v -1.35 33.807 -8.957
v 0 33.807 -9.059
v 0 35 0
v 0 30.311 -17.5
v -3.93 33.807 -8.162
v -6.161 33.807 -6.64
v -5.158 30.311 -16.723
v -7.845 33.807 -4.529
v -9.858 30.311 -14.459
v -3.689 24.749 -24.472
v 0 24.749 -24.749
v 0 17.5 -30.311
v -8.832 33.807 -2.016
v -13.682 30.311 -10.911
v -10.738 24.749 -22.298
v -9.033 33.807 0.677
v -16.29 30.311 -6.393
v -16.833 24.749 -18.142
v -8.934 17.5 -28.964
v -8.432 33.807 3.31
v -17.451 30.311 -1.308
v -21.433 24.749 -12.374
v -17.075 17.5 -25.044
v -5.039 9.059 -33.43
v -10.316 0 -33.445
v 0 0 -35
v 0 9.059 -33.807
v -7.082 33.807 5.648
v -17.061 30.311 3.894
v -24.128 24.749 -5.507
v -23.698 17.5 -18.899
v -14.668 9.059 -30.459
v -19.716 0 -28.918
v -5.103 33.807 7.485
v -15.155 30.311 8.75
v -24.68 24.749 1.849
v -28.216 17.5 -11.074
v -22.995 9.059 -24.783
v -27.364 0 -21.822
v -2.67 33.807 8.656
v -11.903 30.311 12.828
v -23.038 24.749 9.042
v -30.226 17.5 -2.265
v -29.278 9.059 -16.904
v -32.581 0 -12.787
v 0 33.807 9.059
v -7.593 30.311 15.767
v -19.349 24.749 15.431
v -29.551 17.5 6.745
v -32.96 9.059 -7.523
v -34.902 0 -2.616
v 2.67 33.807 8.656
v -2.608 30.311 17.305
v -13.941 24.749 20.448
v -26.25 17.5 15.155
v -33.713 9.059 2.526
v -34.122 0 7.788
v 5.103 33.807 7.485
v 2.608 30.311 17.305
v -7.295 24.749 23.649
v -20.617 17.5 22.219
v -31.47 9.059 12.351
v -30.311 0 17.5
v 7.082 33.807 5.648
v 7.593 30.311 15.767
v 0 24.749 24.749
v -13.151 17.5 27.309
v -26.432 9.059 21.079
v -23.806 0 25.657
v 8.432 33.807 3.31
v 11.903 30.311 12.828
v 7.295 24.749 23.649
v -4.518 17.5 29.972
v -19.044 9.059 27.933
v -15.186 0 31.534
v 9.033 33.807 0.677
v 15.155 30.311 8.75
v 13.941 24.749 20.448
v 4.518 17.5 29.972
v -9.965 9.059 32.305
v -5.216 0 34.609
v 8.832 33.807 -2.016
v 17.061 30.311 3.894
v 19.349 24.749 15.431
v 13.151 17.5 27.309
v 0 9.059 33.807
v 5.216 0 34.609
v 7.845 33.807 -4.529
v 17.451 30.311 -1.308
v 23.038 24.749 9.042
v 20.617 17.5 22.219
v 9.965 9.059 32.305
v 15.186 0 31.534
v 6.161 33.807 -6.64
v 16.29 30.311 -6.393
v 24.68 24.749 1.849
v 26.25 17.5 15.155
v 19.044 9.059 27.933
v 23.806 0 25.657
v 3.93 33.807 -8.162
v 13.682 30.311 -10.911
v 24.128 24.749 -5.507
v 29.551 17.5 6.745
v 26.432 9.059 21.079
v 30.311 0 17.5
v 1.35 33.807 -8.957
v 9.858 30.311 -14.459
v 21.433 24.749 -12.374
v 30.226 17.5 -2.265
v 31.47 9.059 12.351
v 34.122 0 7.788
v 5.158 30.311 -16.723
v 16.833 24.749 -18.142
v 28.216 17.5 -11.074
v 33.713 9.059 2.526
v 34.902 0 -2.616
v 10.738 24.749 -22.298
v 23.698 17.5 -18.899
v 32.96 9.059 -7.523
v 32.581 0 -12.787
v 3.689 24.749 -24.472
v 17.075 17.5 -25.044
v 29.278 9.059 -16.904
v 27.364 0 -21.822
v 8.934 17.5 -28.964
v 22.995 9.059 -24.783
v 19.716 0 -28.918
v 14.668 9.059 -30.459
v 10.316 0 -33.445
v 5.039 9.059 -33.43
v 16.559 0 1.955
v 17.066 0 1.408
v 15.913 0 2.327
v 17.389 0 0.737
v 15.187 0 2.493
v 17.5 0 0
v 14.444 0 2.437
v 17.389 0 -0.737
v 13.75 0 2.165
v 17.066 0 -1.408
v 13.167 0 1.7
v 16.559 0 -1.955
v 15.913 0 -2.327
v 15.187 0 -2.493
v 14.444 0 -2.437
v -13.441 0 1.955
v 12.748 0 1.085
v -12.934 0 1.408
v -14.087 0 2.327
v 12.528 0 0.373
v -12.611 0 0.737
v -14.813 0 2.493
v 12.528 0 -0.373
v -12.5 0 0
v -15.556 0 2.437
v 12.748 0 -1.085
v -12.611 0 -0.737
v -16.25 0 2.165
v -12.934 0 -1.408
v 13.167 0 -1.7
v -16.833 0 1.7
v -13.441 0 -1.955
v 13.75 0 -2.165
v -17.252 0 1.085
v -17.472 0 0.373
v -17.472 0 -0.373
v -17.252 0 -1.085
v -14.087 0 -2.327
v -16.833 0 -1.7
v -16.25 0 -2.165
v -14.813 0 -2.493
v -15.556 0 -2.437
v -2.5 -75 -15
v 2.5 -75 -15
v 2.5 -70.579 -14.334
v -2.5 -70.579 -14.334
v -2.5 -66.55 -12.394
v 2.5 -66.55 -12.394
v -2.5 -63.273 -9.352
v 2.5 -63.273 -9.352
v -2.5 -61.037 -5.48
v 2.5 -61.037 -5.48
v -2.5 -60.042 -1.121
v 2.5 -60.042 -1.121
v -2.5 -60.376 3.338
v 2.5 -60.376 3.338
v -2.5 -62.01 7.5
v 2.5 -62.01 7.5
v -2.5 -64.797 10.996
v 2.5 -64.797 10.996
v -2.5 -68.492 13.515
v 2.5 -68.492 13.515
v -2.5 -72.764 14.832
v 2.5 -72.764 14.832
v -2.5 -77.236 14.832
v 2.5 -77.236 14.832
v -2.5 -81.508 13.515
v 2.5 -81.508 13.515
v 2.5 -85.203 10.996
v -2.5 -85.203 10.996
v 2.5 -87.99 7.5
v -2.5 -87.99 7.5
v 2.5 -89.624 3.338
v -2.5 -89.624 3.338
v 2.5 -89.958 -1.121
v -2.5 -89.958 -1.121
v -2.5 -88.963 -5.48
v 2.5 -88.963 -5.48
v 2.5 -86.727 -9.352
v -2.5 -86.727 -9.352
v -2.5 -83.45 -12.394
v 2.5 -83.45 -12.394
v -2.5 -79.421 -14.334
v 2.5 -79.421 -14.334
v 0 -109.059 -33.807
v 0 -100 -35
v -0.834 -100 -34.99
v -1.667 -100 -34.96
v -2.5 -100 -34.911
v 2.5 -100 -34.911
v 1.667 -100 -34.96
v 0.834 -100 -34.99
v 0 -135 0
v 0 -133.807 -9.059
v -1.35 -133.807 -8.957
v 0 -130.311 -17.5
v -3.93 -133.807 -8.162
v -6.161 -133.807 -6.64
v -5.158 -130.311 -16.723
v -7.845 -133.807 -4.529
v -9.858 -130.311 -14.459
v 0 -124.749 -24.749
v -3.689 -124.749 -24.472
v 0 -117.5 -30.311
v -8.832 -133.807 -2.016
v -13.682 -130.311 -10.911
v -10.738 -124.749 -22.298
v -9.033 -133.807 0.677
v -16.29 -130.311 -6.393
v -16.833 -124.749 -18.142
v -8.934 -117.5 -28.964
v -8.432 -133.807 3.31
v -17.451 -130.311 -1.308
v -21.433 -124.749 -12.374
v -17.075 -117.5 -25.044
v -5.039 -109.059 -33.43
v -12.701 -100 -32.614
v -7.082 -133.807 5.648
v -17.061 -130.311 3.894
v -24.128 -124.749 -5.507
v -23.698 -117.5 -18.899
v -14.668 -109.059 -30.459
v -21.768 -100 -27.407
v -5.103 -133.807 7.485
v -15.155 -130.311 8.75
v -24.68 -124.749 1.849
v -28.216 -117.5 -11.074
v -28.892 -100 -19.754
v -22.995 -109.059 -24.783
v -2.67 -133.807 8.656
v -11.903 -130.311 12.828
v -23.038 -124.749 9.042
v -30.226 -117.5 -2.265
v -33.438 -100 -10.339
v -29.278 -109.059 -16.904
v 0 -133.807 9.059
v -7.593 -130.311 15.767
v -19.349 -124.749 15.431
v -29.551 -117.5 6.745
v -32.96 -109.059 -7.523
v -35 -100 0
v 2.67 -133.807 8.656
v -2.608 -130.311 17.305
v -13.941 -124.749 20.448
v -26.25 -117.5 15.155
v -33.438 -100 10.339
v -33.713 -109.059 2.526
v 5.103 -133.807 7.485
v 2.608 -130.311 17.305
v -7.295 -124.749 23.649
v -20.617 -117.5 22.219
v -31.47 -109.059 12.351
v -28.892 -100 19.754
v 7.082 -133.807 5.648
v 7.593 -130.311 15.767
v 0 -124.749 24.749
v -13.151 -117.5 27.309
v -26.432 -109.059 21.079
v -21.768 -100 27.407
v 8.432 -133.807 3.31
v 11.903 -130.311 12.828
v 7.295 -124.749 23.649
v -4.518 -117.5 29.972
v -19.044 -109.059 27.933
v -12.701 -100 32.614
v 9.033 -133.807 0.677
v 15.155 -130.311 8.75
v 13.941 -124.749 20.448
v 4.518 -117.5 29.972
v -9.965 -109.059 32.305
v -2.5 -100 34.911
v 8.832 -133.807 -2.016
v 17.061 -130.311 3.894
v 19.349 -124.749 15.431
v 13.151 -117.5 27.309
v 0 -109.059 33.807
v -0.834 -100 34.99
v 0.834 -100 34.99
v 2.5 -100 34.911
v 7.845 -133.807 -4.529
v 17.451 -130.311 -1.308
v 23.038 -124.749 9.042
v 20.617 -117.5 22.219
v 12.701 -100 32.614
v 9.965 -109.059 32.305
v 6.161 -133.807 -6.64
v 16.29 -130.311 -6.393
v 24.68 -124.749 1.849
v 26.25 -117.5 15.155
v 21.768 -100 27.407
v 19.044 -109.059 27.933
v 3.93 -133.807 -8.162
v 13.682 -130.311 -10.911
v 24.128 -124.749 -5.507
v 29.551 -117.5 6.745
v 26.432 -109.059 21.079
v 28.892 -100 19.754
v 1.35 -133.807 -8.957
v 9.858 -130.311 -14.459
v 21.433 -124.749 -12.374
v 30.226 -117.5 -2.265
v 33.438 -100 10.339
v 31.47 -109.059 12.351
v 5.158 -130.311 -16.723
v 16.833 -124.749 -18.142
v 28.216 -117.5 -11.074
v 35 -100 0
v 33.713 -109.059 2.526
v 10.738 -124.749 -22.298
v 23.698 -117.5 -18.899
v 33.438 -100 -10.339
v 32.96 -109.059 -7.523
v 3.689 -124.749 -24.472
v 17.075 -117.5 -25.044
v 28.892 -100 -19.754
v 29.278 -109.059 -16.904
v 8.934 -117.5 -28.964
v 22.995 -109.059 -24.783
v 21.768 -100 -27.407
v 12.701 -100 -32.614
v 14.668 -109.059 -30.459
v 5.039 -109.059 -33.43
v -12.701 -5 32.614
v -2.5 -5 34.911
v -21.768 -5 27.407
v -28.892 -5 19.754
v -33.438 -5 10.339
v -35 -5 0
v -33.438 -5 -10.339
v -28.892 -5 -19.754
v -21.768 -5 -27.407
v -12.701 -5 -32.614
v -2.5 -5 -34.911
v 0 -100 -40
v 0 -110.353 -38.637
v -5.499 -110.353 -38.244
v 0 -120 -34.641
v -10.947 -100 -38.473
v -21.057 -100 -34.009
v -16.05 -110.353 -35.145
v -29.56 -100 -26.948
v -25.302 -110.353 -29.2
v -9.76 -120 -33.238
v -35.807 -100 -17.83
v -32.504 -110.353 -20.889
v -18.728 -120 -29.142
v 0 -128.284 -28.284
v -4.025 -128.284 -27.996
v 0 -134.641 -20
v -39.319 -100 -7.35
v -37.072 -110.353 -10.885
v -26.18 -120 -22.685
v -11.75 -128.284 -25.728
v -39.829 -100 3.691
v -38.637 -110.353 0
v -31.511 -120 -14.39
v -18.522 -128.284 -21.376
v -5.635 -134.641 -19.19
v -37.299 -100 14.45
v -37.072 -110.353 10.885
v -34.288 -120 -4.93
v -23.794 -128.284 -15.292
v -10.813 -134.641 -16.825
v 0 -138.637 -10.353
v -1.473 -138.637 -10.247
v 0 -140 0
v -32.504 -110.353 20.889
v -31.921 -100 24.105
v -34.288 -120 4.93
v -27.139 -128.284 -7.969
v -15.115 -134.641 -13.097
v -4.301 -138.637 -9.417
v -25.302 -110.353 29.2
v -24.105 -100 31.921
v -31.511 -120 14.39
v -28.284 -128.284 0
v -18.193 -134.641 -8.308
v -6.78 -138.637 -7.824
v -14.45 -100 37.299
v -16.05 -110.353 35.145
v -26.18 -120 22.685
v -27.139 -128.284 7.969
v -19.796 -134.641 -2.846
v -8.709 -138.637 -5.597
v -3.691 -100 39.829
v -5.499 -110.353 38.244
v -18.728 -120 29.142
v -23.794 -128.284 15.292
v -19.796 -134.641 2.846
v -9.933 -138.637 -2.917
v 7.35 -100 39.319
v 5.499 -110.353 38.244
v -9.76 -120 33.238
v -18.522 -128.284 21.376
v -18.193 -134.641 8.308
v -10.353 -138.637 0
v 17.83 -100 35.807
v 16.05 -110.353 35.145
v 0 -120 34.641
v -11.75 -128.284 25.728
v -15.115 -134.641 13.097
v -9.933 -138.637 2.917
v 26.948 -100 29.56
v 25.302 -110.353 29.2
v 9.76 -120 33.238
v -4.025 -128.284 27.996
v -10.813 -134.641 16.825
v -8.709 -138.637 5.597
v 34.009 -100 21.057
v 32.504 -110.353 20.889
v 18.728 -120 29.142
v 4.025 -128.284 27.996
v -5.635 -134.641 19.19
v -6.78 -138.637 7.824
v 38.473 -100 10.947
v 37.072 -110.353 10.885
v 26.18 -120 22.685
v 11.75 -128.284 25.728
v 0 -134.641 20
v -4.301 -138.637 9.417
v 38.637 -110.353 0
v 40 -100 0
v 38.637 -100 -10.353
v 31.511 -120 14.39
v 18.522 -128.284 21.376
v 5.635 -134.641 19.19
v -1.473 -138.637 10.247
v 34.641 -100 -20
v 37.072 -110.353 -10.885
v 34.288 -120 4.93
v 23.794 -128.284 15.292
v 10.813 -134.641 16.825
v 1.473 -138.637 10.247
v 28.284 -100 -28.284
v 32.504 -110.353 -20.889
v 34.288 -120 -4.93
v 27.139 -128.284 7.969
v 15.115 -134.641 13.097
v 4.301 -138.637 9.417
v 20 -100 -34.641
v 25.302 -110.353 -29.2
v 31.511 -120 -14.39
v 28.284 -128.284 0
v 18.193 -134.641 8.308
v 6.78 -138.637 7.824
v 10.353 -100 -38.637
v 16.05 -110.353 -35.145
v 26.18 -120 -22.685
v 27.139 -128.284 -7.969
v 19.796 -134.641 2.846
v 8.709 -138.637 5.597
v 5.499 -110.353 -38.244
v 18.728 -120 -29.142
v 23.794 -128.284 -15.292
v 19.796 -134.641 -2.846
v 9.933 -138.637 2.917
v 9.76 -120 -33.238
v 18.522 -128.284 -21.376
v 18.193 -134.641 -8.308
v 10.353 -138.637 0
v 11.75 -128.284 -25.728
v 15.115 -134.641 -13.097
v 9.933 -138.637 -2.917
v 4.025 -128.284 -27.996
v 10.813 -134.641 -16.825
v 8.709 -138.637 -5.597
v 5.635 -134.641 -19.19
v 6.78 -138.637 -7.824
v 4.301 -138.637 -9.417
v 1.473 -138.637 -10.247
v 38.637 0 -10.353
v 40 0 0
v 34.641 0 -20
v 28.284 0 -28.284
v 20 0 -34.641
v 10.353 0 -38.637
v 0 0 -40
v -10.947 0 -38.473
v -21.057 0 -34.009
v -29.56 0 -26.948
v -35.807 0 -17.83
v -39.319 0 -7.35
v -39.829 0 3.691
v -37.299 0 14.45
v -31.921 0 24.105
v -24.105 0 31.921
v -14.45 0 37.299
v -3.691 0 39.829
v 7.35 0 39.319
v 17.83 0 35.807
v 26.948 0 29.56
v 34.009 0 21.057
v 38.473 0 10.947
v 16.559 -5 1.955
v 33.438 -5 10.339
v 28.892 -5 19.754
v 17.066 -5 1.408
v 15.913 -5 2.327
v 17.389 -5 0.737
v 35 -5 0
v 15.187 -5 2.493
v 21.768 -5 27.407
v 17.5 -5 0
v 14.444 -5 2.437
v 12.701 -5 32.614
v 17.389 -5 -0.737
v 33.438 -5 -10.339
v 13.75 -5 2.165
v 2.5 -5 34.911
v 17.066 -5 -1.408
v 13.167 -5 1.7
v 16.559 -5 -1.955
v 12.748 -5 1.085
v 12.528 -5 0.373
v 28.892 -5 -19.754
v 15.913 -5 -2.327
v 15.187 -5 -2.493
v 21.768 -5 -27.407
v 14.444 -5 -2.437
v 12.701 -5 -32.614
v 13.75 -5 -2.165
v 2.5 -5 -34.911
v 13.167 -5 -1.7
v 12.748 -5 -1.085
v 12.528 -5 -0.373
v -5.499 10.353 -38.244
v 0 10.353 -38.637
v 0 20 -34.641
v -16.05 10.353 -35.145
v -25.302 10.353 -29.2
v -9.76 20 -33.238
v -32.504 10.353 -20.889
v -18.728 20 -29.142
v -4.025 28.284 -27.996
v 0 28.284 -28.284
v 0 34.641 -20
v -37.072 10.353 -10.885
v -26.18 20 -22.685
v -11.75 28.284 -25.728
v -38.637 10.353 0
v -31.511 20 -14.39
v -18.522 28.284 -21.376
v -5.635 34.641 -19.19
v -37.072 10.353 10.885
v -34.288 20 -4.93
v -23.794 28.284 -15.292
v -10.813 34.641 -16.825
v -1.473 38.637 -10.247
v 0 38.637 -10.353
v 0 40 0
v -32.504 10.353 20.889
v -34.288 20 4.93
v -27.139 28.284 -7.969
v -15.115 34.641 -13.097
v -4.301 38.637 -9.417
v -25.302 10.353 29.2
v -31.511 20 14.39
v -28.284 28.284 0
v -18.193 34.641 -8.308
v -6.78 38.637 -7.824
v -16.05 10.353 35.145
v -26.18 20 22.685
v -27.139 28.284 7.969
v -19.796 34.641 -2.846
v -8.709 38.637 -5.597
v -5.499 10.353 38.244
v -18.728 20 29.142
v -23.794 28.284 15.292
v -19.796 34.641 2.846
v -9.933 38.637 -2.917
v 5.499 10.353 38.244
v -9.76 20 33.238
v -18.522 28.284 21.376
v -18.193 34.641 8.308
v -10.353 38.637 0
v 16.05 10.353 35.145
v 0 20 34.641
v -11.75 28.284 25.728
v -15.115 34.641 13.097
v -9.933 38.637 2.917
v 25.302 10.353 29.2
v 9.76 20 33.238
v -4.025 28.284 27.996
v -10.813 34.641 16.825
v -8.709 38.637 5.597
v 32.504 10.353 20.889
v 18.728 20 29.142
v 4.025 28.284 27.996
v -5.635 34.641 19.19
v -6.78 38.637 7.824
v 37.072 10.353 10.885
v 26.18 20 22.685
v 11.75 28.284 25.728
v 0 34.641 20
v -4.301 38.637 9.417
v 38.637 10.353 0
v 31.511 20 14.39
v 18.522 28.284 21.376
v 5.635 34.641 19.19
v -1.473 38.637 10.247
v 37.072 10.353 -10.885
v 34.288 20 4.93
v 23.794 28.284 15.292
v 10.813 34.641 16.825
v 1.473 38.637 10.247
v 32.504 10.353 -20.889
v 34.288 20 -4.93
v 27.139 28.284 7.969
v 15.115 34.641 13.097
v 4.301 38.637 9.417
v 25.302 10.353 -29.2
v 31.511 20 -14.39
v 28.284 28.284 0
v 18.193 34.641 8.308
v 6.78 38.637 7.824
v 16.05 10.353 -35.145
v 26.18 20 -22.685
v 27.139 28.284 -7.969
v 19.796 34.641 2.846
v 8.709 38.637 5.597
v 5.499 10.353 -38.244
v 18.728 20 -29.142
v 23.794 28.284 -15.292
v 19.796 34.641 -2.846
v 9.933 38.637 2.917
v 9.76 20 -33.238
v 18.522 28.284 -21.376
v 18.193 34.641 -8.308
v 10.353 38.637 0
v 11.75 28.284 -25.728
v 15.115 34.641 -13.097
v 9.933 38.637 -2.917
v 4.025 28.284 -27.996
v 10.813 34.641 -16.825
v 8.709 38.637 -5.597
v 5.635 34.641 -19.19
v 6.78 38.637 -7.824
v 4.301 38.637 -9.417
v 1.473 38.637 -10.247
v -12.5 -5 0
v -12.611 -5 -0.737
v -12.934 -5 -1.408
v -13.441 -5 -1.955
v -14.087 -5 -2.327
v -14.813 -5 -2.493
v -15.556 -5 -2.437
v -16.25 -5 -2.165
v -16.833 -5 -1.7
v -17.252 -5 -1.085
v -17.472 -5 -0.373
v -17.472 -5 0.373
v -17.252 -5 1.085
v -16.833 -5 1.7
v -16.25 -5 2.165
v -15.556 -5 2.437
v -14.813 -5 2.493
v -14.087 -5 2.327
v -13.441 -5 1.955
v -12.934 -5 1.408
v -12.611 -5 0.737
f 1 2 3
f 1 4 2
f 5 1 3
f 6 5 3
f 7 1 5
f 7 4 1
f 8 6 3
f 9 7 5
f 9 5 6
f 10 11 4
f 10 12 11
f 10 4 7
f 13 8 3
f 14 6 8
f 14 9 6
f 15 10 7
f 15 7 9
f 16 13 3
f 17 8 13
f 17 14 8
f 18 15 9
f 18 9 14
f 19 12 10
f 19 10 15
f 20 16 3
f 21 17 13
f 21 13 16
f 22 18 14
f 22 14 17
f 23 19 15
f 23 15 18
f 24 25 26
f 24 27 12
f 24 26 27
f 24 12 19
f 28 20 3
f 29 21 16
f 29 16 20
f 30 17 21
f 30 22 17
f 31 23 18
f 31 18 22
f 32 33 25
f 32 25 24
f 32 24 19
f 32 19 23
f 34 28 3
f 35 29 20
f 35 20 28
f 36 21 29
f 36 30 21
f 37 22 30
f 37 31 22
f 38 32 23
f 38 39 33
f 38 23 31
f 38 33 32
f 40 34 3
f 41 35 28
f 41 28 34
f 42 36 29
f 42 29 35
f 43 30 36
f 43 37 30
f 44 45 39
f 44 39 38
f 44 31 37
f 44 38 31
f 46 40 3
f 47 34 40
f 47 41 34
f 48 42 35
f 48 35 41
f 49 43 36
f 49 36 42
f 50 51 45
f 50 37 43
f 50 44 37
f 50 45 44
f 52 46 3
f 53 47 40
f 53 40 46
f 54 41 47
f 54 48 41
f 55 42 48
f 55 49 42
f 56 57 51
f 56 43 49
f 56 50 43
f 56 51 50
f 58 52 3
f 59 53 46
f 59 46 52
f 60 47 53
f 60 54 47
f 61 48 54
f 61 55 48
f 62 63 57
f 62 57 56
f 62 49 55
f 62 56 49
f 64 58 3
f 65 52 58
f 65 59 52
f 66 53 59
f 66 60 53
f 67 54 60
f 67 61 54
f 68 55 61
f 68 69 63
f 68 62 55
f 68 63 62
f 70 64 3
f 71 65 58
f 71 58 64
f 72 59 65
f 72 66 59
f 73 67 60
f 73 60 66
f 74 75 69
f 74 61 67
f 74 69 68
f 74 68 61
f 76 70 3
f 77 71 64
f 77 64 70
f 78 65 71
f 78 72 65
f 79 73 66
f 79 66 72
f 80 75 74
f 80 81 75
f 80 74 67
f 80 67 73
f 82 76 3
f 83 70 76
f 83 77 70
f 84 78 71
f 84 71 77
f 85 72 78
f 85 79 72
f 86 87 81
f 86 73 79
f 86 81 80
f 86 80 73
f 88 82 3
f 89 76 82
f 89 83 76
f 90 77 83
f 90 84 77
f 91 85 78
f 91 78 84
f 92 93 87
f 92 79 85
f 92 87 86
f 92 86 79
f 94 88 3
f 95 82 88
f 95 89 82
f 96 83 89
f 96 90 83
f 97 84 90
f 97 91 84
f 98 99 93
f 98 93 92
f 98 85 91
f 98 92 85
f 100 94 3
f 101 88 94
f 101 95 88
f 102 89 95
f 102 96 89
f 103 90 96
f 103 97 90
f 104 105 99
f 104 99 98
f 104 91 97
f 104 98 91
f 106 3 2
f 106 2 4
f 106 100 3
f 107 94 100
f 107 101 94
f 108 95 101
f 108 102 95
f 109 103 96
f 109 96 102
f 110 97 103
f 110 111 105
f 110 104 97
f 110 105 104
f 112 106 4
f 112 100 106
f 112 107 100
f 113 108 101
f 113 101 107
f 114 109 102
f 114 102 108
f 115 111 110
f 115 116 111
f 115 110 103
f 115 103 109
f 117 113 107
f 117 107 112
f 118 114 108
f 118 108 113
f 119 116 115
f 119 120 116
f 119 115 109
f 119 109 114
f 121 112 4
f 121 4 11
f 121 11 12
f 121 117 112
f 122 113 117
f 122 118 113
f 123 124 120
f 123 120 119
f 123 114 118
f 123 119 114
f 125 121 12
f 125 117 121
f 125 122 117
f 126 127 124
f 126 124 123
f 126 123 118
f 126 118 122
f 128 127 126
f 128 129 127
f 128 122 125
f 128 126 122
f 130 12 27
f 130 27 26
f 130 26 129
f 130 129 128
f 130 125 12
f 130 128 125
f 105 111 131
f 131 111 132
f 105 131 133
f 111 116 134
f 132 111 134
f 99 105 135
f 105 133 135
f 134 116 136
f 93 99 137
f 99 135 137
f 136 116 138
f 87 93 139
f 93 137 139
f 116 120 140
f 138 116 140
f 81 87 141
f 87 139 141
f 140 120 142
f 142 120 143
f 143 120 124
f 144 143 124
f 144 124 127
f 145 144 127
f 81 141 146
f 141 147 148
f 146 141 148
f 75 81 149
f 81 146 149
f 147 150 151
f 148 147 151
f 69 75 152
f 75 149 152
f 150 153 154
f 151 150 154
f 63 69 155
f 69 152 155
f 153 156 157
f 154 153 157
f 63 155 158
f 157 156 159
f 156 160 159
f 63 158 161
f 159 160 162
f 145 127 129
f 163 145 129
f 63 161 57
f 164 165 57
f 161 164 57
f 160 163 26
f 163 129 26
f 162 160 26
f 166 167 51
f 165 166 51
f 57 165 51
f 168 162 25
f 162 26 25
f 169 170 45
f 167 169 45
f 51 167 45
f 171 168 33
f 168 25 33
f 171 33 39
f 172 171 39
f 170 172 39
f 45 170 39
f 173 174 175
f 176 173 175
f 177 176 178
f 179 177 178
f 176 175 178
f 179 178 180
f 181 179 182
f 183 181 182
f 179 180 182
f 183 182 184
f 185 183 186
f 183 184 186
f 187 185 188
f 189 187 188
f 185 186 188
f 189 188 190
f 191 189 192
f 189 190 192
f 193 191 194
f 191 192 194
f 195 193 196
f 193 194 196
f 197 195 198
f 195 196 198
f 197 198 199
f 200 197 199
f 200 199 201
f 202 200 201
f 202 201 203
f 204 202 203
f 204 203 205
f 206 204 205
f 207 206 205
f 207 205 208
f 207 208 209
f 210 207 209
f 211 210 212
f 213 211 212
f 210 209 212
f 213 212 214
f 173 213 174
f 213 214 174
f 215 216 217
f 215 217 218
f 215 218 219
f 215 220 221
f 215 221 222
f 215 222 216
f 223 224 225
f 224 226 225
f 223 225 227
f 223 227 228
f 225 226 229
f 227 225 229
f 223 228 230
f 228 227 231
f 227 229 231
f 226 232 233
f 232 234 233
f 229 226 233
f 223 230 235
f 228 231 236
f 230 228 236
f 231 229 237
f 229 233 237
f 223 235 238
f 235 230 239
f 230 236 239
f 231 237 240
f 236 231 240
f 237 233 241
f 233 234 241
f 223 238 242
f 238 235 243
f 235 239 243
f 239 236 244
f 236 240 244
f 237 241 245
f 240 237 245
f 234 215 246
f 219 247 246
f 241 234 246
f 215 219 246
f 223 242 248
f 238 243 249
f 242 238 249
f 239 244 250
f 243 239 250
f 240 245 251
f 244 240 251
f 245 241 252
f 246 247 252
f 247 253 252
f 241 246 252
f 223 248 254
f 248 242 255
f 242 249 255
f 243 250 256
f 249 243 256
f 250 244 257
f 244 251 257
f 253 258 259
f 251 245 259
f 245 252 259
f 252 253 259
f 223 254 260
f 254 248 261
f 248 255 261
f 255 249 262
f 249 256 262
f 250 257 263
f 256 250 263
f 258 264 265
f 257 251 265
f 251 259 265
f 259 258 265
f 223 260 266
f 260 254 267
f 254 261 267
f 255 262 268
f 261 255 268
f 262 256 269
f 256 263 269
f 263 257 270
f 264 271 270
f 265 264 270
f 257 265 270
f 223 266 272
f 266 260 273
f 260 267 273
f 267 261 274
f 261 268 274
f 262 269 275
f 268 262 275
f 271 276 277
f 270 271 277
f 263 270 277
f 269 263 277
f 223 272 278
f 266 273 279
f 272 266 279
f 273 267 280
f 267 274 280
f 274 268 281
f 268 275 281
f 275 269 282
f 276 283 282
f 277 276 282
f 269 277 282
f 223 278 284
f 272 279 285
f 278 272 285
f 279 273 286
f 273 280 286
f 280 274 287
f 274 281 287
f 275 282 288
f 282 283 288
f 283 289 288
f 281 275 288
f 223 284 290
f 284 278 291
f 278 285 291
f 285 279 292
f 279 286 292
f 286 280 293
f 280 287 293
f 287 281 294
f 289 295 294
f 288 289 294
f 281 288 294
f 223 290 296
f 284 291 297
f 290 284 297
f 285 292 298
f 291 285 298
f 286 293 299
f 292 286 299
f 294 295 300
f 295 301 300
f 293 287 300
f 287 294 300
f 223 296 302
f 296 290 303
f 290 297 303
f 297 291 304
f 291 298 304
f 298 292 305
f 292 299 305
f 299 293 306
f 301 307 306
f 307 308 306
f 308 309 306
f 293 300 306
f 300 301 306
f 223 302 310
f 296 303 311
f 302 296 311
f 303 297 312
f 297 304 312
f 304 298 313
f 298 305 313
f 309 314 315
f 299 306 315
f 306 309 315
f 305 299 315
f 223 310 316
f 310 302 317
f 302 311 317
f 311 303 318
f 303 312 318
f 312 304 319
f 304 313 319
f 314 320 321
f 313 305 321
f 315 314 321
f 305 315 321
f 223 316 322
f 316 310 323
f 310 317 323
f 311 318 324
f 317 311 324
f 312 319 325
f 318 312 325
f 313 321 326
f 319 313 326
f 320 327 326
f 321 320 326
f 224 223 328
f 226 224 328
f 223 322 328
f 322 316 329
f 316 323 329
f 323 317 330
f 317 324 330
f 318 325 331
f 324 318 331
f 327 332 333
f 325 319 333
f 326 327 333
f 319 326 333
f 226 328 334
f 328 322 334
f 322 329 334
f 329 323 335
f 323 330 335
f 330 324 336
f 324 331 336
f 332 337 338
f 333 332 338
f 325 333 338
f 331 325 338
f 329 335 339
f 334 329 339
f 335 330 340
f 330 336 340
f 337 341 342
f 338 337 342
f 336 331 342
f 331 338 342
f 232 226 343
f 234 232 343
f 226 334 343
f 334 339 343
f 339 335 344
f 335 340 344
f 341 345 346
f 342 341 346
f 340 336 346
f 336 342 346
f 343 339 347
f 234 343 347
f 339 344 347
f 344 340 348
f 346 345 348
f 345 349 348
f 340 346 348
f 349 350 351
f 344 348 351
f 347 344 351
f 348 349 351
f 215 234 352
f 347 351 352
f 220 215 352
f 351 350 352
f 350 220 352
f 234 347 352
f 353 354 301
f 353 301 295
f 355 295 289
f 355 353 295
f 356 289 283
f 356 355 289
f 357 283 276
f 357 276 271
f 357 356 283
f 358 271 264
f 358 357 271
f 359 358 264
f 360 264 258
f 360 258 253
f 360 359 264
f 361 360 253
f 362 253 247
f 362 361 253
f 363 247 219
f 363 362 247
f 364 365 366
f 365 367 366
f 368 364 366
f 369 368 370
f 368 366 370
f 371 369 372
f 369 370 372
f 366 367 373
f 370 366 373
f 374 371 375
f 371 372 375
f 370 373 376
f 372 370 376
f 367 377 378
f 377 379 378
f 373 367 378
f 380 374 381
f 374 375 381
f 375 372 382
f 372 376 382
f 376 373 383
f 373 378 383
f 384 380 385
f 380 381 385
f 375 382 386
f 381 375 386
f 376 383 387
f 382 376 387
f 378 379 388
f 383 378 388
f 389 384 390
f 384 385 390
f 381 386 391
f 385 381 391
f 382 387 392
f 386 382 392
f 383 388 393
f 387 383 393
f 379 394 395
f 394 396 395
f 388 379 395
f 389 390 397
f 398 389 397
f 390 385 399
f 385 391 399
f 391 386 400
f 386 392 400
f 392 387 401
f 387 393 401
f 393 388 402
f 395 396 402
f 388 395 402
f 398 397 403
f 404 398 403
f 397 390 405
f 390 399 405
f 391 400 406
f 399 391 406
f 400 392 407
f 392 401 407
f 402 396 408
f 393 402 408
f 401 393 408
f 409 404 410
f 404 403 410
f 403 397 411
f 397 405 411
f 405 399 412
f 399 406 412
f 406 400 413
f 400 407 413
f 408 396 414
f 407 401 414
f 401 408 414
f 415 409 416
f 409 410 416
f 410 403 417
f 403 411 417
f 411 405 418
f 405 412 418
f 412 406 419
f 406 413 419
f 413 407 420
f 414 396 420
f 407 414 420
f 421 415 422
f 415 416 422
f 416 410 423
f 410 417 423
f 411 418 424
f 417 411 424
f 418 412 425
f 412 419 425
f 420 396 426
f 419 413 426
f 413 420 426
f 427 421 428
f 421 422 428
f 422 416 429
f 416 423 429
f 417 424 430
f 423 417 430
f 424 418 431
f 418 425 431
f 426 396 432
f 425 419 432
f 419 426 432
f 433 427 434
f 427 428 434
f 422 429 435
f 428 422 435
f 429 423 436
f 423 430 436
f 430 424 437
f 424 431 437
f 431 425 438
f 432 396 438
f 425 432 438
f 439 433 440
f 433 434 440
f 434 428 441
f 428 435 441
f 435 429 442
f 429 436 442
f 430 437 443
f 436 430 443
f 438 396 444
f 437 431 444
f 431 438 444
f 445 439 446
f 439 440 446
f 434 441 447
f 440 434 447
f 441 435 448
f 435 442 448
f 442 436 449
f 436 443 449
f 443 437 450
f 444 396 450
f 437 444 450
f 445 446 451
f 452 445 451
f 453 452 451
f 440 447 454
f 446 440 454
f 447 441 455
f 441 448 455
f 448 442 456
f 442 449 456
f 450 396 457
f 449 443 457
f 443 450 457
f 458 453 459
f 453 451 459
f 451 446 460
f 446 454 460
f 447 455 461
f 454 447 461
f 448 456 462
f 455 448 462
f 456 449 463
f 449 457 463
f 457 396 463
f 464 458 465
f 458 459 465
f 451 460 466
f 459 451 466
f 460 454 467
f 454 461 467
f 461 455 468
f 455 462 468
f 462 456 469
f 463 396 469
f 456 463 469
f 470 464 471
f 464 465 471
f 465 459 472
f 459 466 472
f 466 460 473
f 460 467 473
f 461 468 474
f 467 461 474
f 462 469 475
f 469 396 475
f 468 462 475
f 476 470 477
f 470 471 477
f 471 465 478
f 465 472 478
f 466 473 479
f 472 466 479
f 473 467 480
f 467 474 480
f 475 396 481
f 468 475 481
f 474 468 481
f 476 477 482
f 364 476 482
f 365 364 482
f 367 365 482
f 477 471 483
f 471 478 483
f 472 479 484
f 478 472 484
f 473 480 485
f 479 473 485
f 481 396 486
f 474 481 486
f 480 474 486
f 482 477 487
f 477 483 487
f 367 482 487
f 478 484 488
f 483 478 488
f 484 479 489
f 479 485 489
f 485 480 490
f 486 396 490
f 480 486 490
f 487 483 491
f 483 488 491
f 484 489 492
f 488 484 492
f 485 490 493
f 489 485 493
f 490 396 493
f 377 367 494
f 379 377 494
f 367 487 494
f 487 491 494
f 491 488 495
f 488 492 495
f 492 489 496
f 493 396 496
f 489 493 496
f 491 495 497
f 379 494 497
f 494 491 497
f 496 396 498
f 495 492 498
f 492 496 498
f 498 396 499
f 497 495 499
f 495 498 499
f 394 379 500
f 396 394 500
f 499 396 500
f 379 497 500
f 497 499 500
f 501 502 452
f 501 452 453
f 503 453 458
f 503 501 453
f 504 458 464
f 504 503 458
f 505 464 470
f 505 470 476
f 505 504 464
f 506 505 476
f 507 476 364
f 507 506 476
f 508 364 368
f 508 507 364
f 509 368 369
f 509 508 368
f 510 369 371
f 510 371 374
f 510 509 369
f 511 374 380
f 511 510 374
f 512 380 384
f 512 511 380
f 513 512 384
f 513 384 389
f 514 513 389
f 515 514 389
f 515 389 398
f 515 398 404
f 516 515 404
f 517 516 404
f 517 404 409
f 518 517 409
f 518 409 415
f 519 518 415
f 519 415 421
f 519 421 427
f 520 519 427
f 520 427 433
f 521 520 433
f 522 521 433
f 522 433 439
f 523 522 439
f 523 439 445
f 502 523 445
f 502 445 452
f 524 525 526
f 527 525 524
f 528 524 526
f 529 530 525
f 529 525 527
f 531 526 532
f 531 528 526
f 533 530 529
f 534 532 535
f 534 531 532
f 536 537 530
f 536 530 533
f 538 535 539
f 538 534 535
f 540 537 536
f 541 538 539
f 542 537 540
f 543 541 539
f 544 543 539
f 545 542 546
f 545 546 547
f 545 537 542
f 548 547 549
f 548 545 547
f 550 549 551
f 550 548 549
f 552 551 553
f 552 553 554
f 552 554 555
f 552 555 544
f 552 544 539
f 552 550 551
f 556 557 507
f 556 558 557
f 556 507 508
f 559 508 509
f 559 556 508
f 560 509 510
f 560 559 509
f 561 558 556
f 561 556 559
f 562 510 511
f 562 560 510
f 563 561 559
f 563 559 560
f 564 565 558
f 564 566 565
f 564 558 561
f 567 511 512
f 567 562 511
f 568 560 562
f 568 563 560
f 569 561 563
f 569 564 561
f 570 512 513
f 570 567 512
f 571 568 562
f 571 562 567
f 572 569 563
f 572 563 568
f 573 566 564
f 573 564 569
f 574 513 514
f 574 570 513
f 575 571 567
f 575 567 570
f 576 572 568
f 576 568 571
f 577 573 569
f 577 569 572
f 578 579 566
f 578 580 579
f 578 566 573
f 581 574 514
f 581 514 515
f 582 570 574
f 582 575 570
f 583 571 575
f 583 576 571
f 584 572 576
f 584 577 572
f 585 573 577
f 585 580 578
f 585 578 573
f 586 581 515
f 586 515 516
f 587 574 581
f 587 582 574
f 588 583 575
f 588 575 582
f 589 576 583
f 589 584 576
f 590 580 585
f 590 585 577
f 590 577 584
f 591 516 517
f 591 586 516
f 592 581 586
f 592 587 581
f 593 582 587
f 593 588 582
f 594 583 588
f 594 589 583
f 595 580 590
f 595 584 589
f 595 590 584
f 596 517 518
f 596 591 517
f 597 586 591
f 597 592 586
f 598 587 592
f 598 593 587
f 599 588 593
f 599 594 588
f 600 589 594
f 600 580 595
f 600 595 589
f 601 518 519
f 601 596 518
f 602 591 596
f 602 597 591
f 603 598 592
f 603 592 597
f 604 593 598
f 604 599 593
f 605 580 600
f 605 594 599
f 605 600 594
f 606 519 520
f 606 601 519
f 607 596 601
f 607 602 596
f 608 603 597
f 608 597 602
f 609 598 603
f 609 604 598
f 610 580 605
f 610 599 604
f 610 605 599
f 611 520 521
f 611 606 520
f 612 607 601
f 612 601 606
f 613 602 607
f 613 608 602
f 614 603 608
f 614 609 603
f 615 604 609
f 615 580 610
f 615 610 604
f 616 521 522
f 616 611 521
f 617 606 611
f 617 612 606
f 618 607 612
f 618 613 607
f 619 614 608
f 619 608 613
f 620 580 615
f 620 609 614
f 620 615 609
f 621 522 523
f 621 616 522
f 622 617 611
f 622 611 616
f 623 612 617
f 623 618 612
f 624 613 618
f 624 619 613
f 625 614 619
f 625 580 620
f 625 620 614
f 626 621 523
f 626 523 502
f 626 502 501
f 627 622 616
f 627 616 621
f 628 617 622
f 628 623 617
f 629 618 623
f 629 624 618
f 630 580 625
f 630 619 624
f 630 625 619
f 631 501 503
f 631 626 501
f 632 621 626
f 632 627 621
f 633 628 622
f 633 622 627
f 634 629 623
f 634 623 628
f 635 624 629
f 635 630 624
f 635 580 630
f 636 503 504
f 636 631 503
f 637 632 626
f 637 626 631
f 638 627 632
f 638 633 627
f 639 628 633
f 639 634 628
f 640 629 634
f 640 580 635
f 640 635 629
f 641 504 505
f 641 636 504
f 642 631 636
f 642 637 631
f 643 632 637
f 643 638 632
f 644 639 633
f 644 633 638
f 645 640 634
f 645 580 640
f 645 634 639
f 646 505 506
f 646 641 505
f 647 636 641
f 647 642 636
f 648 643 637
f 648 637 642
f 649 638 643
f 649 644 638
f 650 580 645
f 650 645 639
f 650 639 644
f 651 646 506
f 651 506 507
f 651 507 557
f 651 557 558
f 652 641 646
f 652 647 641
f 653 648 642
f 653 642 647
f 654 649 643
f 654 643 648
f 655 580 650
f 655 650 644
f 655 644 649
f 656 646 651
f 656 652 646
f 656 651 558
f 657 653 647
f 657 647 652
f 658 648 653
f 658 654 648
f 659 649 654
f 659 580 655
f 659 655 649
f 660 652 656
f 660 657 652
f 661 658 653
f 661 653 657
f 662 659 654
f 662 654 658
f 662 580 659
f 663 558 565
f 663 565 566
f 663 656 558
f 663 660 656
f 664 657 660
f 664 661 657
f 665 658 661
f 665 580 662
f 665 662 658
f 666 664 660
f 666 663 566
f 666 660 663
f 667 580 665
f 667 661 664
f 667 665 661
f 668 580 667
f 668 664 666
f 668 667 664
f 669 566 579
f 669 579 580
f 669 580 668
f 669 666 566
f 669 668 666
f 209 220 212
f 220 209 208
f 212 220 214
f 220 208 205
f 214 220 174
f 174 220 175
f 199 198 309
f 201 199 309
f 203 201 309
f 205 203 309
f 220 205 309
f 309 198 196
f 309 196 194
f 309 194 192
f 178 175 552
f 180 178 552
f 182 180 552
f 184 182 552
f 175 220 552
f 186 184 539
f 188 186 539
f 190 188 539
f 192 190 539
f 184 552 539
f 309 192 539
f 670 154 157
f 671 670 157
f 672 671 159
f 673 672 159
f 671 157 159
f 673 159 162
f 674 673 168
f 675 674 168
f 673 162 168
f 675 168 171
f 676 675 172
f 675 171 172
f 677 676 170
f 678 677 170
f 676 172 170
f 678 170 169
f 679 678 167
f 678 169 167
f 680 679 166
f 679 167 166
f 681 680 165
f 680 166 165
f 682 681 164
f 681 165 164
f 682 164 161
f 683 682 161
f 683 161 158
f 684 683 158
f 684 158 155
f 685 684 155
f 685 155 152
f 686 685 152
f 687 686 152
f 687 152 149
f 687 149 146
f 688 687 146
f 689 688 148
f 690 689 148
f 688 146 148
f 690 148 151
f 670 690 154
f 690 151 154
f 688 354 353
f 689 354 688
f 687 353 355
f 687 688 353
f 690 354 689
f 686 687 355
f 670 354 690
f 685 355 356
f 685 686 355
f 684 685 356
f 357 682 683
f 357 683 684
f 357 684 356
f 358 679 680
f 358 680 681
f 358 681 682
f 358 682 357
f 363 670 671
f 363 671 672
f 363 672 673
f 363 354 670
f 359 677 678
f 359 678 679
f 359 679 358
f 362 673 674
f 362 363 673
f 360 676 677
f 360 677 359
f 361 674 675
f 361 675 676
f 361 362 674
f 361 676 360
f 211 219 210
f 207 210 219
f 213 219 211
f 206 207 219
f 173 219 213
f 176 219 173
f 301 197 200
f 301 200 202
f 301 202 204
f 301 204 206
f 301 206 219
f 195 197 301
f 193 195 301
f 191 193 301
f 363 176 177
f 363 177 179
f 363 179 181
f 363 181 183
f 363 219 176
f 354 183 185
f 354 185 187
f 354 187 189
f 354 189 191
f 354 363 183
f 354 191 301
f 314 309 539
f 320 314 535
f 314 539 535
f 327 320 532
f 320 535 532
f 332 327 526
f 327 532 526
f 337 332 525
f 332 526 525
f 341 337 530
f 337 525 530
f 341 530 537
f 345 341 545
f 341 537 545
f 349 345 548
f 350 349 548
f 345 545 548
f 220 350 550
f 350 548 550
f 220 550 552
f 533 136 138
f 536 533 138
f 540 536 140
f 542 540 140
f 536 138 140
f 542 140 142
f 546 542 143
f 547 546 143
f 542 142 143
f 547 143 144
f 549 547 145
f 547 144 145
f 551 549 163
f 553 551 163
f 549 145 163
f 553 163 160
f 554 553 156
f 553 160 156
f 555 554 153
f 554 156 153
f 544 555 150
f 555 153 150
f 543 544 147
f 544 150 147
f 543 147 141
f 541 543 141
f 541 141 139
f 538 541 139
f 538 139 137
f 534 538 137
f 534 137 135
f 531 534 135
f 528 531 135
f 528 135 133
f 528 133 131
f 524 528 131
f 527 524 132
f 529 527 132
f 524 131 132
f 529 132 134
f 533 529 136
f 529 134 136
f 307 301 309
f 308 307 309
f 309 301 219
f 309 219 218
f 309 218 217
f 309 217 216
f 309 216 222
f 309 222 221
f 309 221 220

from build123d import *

# Parameters (mm, degrees)
SKETCH1_R           = 40
BOSS_EXTRUDE1_DEPTH = 100
SKETCH2_R           = 15
CUT_EXTRUDE1_DEPTH  = 5
BOSS_EXTRUDE2_DEPTH = 5
SKETCH4_R           = 2.5
CUT_EXTRUDE2_DEPTH  = 5


with BuildPart() as part:
    # Sketch1 → Boss-Extrude1 (new body)
    with BuildSketch(Plane(origin=(0, 0, 0), x_dir=(1, 0, 0), z_dir=(0, 1, 0))):
        Circle(SKETCH1_R)
        with BuildLine():
            Line((-2.5, 34.910600109), (-2.5, -34.910600109))
            ThreePointArc((-2.5, -34.910600109), (-35, 0), (-2.5, 34.910600109))
        make_face(mode=Mode.SUBTRACT)
        with BuildLine():
            Line((2.5, 34.910600109), (2.5, -34.910600109))
            ThreePointArc((2.5, -34.910600109), (35, 0), (2.5, 34.910600109))
        make_face(mode=Mode.SUBTRACT)
    extrude(amount=-BOSS_EXTRUDE1_DEPTH)

    # Sketch2 → Cut-Extrude1 (cut)
    with BuildSketch(Plane(origin=(2.5, 0, 0), x_dir=(0, 0, -1), z_dir=(1, 0, 0))):
        with Locations((0, -75)):
            Circle(SKETCH2_R)
    extrude(amount=-CUT_EXTRUDE1_DEPTH, mode=Mode.SUBTRACT)

    # Sketch3 → Revolve1 (revolve)
    with BuildSketch(Plane(origin=(0, 0, 0), x_dir=(0, 0, -1), z_dir=(1, 0, 0))):
        with BuildLine():
            Line((35, -100), (40, -100))
            ThreePointArc((40, -100), (28.284271247, -128.284271247), (0, -140))
            Line((0, -140), (0, -135))
            ThreePointArc((0, -135), (24.748737342, -124.748737342), (35, -100))
        make_face()
    revolve1 = revolve(axis=Axis((0, -140, 0), (0, 1, 0)))

    # Sketch1<2> → Boss-Extrude2 (add)
    with BuildSketch(Plane(origin=(0, 0, 0), x_dir=(1, 0, 0), z_dir=(0, 1, 0))):
        with BuildLine():
            Line((-2.5, -34.910600109), (-2.5, 34.910600109))
            ThreePointArc((-2.5, 34.910600109), (-35, 0), (-2.5, -34.910600109))
        make_face()
        with BuildLine():
            ThreePointArc((2.5, -34.910600109), (35, 0), (2.5, 34.910600109))
            Line((2.5, 34.910600109), (2.5, -34.910600109))
        make_face()
    extrude(amount=-BOSS_EXTRUDE2_DEPTH)

    # Sketch4 → Cut-Extrude2 (cut)
    with BuildSketch(Plane(origin=(0, 0, 0), x_dir=(1, 0, 0), z_dir=(0, 1, 0))):
        with Locations((-15, 0)):
            Circle(SKETCH4_R)
        with Locations((15, 0)):
            Circle(SKETCH4_R)
    extrude(amount=-CUT_EXTRUDE2_DEPTH, mode=Mode.SUBTRACT)

    # Mirror1: Revolve1 across plane
    add(revolve1.mirror(Plane.ZX.offset(-50)))


solid = part.part
